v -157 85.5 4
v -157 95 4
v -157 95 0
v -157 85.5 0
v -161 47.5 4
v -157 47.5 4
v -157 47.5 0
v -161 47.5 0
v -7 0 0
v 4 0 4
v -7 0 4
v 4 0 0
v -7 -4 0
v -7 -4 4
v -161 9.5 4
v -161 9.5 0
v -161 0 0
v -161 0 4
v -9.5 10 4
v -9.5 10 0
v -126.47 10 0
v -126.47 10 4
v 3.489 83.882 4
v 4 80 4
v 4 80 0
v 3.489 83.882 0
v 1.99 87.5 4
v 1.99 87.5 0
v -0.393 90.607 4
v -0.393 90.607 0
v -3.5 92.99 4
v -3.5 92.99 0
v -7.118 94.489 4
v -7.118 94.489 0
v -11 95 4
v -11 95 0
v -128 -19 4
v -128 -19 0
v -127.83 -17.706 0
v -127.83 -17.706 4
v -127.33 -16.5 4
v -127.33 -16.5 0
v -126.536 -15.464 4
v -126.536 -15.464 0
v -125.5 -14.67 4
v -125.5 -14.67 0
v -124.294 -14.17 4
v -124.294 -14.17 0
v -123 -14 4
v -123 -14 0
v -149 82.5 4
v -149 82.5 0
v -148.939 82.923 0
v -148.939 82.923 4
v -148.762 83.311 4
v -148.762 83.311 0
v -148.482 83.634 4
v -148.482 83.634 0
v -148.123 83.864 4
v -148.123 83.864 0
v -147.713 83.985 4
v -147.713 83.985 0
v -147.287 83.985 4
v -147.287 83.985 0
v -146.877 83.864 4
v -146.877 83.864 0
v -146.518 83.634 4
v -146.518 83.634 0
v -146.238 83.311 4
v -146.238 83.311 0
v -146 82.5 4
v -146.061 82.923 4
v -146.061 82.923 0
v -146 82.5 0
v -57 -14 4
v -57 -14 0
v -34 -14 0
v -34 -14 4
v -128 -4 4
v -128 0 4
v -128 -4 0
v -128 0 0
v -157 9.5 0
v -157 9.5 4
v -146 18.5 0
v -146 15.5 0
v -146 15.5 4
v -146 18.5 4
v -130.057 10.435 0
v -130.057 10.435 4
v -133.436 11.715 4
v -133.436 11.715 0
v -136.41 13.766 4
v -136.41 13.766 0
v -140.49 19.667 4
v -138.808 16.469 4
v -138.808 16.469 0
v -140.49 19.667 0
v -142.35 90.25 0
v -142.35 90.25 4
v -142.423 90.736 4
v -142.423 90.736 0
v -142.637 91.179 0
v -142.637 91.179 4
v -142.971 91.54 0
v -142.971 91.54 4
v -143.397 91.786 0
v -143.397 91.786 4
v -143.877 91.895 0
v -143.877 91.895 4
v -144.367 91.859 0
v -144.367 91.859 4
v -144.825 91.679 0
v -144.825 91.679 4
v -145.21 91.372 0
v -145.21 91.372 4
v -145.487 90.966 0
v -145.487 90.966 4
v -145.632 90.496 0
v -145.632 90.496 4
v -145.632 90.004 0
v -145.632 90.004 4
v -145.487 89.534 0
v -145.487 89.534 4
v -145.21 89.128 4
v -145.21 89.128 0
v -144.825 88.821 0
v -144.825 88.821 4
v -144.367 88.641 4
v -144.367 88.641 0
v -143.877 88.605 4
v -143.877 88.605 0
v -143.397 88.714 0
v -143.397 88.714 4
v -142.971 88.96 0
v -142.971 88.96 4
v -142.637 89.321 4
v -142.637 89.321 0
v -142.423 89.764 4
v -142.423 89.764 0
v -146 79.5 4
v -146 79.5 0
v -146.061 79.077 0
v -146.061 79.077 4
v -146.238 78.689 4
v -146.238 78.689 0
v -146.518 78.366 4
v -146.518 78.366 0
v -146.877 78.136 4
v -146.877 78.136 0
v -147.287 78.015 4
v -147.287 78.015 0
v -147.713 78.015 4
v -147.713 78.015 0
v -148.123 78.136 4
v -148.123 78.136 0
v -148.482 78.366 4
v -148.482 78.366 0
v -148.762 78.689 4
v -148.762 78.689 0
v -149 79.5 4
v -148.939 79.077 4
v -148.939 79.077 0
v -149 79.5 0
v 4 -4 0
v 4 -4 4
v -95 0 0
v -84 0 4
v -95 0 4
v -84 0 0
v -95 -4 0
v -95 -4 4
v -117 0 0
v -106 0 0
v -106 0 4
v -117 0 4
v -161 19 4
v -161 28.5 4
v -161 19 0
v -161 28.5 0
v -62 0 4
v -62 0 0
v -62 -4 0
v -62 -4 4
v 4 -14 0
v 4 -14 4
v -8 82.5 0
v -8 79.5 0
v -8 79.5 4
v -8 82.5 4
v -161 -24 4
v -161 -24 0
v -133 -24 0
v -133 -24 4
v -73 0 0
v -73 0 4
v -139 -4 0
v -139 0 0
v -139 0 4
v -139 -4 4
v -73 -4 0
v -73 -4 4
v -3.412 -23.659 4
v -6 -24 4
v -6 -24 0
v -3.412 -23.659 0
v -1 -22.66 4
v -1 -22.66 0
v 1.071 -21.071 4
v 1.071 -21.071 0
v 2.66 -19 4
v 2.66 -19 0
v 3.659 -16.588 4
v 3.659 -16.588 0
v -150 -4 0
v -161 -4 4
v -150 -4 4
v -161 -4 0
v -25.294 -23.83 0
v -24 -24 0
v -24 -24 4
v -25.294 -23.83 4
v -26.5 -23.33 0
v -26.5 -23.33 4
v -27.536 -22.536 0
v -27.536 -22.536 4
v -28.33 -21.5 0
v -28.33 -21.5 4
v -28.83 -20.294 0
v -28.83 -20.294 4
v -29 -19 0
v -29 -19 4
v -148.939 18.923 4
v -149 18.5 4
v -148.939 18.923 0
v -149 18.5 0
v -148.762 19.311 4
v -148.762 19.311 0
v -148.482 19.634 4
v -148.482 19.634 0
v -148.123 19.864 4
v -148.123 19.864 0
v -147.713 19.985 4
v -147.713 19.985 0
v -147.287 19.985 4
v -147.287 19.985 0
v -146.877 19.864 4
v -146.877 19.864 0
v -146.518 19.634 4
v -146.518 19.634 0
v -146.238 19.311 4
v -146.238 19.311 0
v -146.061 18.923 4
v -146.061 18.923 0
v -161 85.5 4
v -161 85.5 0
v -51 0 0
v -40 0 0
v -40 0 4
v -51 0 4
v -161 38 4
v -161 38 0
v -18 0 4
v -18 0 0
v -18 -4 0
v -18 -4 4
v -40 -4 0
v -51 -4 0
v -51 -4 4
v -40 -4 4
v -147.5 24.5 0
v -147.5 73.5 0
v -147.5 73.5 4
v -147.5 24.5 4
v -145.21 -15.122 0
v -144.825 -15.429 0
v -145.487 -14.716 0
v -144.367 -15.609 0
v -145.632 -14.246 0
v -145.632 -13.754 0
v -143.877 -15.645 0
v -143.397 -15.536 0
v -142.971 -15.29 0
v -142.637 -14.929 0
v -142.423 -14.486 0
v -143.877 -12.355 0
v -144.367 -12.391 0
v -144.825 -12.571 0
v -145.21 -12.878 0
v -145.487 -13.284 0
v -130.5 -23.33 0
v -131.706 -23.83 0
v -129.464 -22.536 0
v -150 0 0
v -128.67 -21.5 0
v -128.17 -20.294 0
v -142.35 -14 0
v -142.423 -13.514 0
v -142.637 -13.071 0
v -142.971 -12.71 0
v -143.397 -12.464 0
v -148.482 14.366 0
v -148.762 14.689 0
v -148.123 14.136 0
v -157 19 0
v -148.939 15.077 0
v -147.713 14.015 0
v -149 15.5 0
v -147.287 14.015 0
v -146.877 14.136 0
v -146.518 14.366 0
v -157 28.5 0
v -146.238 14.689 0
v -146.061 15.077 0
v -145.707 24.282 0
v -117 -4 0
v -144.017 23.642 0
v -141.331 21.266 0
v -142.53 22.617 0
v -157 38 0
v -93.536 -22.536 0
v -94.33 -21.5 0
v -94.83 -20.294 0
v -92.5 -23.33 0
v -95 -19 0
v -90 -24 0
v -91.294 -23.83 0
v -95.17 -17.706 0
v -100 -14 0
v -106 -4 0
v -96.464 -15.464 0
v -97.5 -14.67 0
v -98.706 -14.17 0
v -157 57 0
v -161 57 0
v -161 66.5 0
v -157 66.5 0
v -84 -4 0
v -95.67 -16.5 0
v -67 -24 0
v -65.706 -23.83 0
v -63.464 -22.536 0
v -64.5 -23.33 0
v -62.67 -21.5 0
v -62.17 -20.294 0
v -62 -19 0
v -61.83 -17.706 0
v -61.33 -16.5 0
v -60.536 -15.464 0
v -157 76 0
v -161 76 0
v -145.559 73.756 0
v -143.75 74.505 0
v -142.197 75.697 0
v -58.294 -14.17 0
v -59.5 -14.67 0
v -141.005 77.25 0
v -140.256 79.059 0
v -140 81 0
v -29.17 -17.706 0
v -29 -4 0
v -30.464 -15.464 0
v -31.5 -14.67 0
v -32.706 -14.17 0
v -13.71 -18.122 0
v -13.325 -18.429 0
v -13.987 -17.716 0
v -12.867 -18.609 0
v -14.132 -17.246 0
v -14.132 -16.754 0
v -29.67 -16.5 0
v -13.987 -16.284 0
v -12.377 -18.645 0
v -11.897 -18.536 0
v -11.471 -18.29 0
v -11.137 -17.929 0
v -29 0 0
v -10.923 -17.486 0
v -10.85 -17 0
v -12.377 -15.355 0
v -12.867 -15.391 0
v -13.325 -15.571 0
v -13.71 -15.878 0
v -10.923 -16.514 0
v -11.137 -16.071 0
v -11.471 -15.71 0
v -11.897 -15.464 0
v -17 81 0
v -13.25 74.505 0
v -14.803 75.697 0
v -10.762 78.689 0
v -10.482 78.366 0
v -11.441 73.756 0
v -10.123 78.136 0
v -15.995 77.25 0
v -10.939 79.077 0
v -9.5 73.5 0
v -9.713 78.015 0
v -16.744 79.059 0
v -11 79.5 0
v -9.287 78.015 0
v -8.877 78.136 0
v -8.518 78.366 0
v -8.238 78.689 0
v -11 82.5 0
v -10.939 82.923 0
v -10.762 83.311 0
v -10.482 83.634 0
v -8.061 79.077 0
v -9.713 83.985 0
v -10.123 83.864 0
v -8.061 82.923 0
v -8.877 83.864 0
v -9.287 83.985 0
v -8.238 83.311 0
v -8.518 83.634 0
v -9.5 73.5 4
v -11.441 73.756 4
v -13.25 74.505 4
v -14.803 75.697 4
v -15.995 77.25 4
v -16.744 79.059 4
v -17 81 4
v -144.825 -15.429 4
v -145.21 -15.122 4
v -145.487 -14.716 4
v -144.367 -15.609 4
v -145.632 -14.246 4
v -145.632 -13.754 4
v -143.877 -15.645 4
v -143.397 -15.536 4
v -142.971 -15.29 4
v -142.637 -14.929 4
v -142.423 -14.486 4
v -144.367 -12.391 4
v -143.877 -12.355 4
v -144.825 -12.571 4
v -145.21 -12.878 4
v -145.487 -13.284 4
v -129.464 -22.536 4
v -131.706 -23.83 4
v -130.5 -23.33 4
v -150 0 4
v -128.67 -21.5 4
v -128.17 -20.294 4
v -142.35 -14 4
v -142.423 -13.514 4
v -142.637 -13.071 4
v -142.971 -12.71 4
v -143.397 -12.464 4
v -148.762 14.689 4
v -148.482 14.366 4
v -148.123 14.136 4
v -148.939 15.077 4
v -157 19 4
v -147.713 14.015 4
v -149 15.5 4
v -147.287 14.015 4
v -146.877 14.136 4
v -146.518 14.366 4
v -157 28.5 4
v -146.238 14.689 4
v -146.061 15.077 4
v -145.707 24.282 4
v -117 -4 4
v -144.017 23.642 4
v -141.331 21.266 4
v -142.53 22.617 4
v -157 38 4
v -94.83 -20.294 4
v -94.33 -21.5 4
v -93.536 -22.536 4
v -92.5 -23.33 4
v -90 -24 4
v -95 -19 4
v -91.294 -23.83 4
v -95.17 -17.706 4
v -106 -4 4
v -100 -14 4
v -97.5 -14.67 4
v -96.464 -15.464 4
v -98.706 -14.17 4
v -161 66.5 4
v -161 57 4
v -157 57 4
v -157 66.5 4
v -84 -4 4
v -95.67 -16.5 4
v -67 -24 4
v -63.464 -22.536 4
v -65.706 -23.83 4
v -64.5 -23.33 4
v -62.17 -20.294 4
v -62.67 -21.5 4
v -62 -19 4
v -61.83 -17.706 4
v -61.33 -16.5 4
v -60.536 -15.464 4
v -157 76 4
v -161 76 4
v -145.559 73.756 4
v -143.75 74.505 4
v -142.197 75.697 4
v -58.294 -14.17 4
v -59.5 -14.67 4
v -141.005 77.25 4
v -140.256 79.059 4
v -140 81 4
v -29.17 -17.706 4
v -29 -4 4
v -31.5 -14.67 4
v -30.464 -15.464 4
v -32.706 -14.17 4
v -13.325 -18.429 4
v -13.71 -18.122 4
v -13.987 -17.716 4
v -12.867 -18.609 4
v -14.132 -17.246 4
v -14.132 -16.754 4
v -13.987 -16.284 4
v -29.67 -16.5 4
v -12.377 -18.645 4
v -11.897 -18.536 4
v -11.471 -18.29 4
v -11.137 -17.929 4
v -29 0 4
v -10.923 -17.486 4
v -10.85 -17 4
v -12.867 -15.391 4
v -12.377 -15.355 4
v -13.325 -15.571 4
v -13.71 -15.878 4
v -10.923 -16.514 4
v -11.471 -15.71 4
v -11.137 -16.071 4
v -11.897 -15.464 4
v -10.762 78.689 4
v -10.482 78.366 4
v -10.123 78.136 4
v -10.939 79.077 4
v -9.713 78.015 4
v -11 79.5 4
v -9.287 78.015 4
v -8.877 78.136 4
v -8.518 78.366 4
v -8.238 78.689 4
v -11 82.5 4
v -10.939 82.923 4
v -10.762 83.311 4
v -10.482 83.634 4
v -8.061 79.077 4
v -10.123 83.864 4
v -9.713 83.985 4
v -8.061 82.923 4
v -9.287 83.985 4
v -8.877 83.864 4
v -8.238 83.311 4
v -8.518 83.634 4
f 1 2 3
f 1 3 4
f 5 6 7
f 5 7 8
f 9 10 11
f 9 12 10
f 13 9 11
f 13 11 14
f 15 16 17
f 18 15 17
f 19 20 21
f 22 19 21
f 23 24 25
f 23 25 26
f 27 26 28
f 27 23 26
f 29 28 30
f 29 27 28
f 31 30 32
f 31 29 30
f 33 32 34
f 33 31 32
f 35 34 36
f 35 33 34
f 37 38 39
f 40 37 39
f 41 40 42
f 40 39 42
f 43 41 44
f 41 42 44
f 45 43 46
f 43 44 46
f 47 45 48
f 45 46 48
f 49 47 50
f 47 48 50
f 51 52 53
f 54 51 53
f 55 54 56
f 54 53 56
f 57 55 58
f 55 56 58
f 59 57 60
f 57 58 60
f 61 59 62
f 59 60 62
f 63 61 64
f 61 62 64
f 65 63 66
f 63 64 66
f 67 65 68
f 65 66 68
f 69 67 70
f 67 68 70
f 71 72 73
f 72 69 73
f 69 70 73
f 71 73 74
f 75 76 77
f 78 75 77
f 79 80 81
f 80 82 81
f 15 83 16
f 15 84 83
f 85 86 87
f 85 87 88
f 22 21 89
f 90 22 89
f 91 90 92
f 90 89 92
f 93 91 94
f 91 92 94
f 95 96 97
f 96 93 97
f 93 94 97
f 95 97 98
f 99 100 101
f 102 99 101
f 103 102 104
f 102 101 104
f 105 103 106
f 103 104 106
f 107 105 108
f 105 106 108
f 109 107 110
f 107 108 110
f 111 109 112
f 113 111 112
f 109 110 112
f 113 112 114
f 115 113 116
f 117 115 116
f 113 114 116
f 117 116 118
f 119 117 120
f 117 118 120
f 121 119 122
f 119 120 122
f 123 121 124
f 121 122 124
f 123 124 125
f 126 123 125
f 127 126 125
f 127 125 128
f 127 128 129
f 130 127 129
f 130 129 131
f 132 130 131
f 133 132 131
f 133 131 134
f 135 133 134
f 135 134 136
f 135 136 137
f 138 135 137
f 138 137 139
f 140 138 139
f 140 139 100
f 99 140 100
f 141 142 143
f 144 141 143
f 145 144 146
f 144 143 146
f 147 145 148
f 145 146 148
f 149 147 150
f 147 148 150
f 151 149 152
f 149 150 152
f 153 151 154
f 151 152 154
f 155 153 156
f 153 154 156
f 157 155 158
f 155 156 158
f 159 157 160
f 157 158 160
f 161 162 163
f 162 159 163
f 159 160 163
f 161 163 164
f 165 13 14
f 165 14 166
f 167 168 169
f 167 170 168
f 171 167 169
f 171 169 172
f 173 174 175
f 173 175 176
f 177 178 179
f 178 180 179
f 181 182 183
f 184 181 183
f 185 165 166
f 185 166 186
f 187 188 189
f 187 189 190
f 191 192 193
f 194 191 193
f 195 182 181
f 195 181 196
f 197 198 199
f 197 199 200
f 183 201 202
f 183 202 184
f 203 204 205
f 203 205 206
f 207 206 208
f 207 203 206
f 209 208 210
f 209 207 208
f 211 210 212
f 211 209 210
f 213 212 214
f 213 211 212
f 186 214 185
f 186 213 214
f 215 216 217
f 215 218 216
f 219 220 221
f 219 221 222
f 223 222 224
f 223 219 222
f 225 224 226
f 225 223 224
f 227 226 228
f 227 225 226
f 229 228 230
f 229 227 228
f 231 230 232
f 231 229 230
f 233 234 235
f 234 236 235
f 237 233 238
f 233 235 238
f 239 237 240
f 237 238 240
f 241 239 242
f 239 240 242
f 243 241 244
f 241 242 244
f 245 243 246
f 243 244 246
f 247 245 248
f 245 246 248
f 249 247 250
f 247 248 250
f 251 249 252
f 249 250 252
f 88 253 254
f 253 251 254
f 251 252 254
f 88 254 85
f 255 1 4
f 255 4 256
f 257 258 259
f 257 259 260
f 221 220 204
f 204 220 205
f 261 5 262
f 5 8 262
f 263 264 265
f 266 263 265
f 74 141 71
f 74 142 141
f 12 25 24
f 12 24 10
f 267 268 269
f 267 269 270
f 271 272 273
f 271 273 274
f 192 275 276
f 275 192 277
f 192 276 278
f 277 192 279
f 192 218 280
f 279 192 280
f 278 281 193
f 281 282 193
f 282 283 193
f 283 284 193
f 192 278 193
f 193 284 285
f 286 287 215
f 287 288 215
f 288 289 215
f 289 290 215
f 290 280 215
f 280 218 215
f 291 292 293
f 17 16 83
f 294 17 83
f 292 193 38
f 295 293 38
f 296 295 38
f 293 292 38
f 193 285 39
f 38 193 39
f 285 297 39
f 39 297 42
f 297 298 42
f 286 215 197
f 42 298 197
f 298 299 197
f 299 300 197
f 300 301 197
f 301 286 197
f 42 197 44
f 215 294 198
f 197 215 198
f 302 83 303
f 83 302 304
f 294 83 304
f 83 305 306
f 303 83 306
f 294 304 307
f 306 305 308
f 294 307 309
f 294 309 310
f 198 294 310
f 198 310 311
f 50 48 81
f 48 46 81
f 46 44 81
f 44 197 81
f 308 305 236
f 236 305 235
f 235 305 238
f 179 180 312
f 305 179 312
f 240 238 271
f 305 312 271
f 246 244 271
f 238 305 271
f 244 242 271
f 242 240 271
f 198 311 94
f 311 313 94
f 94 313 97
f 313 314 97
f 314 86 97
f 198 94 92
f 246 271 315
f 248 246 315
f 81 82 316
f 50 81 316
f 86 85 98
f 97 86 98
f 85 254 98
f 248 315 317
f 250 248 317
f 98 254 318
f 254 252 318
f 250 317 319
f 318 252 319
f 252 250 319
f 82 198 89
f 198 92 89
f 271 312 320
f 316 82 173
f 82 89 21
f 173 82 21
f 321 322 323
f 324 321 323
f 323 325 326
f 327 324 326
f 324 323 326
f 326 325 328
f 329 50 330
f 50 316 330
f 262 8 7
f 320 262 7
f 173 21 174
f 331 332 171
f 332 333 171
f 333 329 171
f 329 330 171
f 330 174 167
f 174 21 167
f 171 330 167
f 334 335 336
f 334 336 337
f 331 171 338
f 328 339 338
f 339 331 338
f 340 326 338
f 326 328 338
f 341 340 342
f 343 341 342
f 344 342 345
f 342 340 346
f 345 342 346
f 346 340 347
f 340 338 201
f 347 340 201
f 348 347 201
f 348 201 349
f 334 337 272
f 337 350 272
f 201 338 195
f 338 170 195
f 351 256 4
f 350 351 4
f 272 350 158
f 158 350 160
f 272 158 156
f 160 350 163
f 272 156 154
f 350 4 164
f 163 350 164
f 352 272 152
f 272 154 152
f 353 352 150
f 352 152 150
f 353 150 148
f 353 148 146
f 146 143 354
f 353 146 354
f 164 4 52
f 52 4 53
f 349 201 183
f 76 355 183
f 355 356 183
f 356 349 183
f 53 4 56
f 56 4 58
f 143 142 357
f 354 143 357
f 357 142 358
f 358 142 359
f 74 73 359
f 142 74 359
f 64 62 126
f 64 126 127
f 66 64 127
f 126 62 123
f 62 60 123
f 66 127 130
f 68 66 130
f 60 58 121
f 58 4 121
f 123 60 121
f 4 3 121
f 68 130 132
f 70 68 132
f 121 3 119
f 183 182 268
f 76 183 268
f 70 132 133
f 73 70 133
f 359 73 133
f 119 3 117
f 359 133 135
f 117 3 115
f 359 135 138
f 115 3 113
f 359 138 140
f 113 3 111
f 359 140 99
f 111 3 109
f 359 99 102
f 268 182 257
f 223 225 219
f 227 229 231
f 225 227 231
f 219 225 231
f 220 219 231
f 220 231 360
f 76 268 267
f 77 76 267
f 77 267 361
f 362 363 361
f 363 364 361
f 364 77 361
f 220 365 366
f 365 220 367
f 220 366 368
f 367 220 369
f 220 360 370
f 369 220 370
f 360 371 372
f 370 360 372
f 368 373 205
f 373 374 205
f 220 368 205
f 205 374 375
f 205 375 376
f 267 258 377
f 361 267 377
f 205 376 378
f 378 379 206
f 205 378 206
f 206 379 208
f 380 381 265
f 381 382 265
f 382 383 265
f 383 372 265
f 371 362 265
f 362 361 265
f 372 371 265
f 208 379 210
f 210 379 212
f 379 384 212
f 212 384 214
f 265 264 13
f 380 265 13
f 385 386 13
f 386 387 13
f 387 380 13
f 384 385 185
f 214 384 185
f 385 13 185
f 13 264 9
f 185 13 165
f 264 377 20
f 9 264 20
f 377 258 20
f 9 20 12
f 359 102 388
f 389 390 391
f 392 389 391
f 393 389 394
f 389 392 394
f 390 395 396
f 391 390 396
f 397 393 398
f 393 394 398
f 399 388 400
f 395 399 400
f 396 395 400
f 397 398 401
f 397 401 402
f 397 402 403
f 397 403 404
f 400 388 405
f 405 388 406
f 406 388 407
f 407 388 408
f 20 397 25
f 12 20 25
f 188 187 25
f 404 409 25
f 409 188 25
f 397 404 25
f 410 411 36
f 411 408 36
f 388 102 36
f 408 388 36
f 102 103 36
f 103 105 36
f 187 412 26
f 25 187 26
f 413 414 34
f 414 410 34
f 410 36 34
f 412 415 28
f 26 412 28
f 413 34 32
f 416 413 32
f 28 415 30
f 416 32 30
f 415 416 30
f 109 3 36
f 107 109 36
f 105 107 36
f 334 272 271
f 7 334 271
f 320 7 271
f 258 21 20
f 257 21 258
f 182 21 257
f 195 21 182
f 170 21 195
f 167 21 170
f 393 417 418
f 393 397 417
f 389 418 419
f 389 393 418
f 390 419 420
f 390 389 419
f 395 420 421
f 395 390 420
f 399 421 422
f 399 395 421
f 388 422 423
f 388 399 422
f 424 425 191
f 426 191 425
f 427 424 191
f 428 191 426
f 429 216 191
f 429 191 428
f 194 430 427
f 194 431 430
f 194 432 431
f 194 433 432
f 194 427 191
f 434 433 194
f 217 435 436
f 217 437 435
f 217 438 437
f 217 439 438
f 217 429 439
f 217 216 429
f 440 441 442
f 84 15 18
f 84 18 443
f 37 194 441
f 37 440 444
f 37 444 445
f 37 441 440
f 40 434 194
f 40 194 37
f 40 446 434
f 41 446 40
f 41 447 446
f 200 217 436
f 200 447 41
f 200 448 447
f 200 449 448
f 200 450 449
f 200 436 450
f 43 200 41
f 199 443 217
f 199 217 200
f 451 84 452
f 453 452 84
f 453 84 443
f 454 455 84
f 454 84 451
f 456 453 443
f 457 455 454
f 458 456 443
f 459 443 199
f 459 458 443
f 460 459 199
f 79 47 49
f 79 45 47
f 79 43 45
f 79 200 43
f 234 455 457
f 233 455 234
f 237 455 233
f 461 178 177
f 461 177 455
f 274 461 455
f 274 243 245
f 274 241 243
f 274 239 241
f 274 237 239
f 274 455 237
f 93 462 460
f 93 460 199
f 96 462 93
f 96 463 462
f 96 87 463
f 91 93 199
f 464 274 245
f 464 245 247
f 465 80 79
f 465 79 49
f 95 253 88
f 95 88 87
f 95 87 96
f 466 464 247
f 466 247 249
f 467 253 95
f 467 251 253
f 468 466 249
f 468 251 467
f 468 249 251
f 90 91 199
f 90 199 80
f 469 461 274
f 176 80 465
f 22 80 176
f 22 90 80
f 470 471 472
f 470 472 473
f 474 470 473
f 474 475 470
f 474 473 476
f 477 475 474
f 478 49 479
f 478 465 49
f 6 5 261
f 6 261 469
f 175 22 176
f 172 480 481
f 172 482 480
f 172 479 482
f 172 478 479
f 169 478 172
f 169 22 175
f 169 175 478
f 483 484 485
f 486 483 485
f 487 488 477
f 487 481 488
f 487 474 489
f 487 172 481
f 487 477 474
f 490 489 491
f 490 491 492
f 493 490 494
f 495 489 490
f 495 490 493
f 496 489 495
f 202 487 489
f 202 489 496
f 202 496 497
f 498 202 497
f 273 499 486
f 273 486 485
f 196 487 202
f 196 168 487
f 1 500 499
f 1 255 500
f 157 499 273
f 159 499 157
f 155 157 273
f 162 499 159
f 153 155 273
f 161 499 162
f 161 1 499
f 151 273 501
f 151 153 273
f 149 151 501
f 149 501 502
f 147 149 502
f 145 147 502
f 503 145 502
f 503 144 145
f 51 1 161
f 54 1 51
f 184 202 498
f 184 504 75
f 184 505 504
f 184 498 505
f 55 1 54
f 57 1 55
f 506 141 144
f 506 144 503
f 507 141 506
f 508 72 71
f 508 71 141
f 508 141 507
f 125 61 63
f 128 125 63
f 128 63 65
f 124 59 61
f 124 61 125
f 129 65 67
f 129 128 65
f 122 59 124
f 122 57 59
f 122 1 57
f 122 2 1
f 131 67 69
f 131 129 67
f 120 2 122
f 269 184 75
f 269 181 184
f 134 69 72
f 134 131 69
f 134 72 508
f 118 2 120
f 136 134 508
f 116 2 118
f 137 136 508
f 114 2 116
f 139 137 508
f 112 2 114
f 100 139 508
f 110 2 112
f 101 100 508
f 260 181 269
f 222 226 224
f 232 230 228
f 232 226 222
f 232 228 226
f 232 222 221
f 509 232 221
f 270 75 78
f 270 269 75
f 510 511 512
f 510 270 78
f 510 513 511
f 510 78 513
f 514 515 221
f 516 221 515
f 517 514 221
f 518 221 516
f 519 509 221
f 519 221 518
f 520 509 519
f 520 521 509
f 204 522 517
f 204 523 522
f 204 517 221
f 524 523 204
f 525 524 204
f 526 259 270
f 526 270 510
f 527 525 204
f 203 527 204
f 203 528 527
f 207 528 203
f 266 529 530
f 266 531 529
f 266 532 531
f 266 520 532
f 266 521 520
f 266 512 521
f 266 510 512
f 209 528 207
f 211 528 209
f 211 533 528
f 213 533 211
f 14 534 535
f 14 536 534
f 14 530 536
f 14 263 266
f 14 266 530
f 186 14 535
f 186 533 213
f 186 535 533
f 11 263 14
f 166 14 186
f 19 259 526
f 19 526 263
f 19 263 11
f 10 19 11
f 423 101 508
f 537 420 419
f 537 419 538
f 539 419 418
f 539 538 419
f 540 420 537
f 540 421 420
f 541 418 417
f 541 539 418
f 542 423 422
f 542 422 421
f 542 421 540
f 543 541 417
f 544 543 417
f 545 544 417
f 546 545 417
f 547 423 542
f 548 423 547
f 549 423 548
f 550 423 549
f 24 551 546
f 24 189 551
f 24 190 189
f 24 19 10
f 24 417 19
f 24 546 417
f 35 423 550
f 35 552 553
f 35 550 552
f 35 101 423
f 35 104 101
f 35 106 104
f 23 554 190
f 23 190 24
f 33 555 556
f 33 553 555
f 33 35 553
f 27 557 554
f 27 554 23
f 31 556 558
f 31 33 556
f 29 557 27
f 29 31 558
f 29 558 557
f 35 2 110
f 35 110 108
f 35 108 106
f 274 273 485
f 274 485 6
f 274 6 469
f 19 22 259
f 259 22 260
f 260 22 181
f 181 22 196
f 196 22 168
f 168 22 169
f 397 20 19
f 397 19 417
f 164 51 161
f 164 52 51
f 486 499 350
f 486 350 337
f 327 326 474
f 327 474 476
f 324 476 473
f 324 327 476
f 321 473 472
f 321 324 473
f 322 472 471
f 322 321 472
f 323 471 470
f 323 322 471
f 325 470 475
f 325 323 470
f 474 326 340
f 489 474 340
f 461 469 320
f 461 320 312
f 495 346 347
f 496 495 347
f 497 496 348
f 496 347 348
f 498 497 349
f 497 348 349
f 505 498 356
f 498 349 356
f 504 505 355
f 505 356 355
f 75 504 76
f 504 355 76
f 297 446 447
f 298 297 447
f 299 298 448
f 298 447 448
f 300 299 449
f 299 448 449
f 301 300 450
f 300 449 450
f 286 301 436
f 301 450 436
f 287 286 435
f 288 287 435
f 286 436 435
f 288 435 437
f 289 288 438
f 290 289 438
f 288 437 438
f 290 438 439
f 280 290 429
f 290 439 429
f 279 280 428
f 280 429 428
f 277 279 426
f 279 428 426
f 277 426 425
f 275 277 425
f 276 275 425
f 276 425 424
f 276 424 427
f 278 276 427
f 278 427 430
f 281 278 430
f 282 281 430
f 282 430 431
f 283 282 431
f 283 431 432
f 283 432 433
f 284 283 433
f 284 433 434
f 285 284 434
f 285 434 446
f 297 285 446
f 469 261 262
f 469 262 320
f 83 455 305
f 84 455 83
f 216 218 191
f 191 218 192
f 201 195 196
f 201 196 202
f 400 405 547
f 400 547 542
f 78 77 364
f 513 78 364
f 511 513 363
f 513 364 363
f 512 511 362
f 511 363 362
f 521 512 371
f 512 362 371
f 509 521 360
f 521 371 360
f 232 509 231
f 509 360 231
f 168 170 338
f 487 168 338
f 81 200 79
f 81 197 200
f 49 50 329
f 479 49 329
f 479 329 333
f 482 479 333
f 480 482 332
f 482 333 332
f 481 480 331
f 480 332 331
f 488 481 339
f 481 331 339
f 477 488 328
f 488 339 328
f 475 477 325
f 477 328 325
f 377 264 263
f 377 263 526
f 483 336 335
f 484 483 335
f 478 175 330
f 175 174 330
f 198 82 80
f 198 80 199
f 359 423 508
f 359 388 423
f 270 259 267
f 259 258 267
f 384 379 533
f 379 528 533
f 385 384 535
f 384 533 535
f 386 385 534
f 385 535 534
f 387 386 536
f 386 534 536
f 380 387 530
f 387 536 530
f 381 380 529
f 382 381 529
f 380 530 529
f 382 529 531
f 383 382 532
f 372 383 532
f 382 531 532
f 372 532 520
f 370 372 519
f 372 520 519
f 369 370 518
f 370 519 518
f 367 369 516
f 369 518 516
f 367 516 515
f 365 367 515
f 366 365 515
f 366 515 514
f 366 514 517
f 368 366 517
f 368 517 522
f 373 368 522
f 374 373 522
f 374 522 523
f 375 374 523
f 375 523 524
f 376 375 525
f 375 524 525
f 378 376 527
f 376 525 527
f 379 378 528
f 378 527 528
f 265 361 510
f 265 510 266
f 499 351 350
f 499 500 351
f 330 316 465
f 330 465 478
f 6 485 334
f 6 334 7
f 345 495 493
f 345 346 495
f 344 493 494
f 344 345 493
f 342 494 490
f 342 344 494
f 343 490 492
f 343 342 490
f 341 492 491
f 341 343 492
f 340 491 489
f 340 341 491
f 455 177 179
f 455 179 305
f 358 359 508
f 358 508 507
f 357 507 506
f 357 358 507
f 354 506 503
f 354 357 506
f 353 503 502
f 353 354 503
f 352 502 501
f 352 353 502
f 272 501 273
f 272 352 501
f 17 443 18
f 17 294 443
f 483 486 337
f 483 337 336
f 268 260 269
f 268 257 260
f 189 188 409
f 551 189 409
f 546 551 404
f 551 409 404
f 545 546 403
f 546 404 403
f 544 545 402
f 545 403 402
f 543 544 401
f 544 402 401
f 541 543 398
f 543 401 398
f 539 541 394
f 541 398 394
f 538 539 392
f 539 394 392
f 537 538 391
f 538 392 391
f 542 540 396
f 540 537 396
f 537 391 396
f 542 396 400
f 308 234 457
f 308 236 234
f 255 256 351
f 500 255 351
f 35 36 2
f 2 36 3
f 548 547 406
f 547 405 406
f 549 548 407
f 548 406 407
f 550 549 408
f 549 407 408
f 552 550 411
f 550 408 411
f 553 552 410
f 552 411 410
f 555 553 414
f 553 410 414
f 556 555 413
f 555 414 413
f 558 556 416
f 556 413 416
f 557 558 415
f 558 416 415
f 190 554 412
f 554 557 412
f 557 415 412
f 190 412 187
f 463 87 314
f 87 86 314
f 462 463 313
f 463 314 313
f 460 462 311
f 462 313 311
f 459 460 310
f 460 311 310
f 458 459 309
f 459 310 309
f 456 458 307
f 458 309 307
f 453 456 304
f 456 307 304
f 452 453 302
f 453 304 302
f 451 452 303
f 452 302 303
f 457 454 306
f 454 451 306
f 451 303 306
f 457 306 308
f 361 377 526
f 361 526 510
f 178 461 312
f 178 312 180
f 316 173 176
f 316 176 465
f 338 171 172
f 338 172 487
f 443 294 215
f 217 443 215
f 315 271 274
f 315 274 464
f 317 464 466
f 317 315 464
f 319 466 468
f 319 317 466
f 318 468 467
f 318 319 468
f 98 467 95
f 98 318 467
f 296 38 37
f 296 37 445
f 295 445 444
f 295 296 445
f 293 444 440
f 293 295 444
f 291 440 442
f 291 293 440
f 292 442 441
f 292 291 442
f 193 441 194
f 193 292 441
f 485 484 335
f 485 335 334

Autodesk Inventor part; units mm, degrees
ref_plane "YZ Plane" through (0, 0, 0) normal (1, 0, 0) x (0, 1, 0)
ref_plane "XZ Plane" through (0, 0, 0) normal (0, 1, 0) x (-1, 0, 0)
ref_plane "XY Plane" through (0, 0, 0) normal (0, 0, 1) x (1, 0, 0)
sketch "Schizzo1" plane through (0, 0, 0) normal (0, 0, 1) x (1, 0, 0)
  line L0 (-152.5, 86) -> (-2.5, 86) construction
  line L1 (-152.5, 0) -> (-152.5, 86) construction
  line L2 (-2.5, 0) -> (-2.5, 86) construction
  circle A0 centre (-9.5, 81) radius 1.5 projected
  circle A1 centre (-147.5, 81) radius 1.5 projected
  circle A2 centre (-147.5, 17) radius 1.5 projected
  line L3 (4, 95) -> (-161, 95)
  line L4 (-161, -24) -> (-133, -24)
  line L5 (-128, -19) -> (-128, -19)
  line L6 (-123, -14) -> (-100, -14)
  line L7 (-95, -19) -> (-95, -19)
  line L8 (-90, -24) -> (-67, -24)
  line L9 (-62, -19) -> (-62, -19)
  line L10 (-57, -14) -> (-34, -14)
  line L11 (-29, -19) -> (-29, -19)
  line L12 (-24, -24) -> (4, -24)
  arc A3 (-133, -24) -> (-128, -19) centre (-133, -19) ccw
  arc A4 (-123, -14) -> (-128, -19) centre (-123, -19) ccw
  arc A5 (-95, -19) -> (-100, -14) centre (-100, -19) ccw
  arc A6 (-95, -19) -> (-90, -24) centre (-90, -19) ccw
  arc A7 (-67, -24) -> (-62, -19) centre (-67, -19) ccw
  arc A8 (-57, -14) -> (-62, -19) centre (-57, -19) ccw
  arc A9 (-29, -19) -> (-34, -14) centre (-34, -19) ccw
  arc A10 (-29, -19) -> (-24, -24) centre (-24, -19) ccw
  arc A11 (-17, 81) -> (-9.5, 73.5) centre (-9.5, 81) ccw
  arc A12 (-147.5, 73.5) -> (-140, 81) centre (-147.5, 81) ccw
  arc A13 (-140.4901, 19.6667) -> (-147.5, 24.5) centre (-147.5, 17) ccw
  line L13 (-147.5, 73.5) -> (-147.5, 24.5)
  line L14 (-17, 81) -> (-140, 81)
  line L15 (-9.5, 10) -> (-126.4703, 10)
  arc A14 (-140.4901, 19.6667) -> (-126.4703, 10) centre (-126.4703, 25) ccw
  line L16 (-9.5, 10) -> (-9.5, 73.5)
  line L17 (-161, 95) -> (-161, -24)
  line L18 (4, 95) -> (4, -24)
  line L19 (-161, -4) -> (-150, -4) projected
  line L20 (-150, 0) -> (-150, -4) projected
  line L21 (-150, 0) -> (-161, 0) projected
  line L22 (-161, 0) -> (-161, -4) projected
  line L23 (-139, -4) -> (-128, -4) projected
  line L24 (-128, 0) -> (-128, -4) projected
  line L25 (-128, 0) -> (-139, 0) projected
  line L26 (-139, 0) -> (-139, -4) projected
  line L27 (-117, -4) -> (-106, -4) projected
  line L28 (-106, 0) -> (-106, -4) projected
  line L29 (-106, 0) -> (-117, 0) projected
  line L30 (-117, 0) -> (-117, -4) projected
  line L31 (-95, -4) -> (-84, -4) projected
  line L32 (-84, 0) -> (-84, -4) projected
  line L33 (-84, 0) -> (-95, 0) projected
  line L34 (-95, 0) -> (-95, -4) projected
  line L35 (-73, -4) -> (-62, -4) projected
  line L36 (-62, 0) -> (-62, -4) projected
  line L37 (-62, 0) -> (-73, 0) projected
  line L38 (-73, 0) -> (-73, -4) projected
  line L39 (-51, -4) -> (-40, -4) projected
  line L40 (-40, 0) -> (-40, -4) projected
  line L41 (-40, 0) -> (-51, 0) projected
  line L42 (-51, 0) -> (-51, -4) projected
  line L43 (-29, -4) -> (-18, -4) projected
  line L44 (-18, 0) -> (-18, -4) projected
  line L45 (-18, 0) -> (-29, 0) projected
  line L46 (-29, 0) -> (-29, -4) projected
  line L47 (-7, -4) -> (4, -4) projected
  line L48 (-7, 0) -> (-7, -4) projected
  line L49 (-147.5, 82.5) -> (-147.5, 79.5) construction
  line L50 (-149, 82.5) -> (-149, 79.5)
  line L51 (-146, 79.5) -> (-146, 82.5)
  arc A15 (-146, 82.5) -> (-149, 82.5) centre (-147.5, 82.5) ccw
  arc A16 (-149, 79.5) -> (-146, 79.5) centre (-147.5, 79.5) ccw
  line L52 (-9.5, 82.5) -> (-9.5, 79.5) construction
  line L53 (-11, 82.5) -> (-11, 79.5)
  line L54 (-8, 79.5) -> (-8, 82.5)
  arc A17 (-8, 82.5) -> (-11, 82.5) centre (-9.5, 82.5) ccw
  arc A18 (-11, 79.5) -> (-8, 79.5) centre (-9.5, 79.5) ccw
  line L55 (-147.5, 18.5) -> (-147.5, 15.5) construction
  line L56 (-149, 18.5) -> (-149, 15.5)
  line L57 (-146, 15.5) -> (-146, 18.5)
  arc A19 (-146, 18.5) -> (-149, 18.5) centre (-147.5, 18.5) ccw
  arc A20 (-149, 15.5) -> (-146, 15.5) centre (-147.5, 15.5) ccw
  line L58 (4, 0) -> (4, -4) projected
  line L59 (4, 0) -> (-7, 0) projected
  point P0 (-128, -24)
  point P1 (-128, -14)
  point P2 (-95, -14)
  point P3 (-95, -24)
  point P4 (-62, -24)
  point P5 (-62, -14)
  point P6 (-29, -14)
  point P7 (-29, -24)
  point P8 (-144.8074, 10)
  dimension "d0" = 165
  dimension "d9" = 33
  dimension "d10" = 10
  dimension "d11" = 33
  dimension "d12" = 10
  dimension "d13" = 33
  dimension "d14" = 10
  dimension "d15" = 33
  dimension "d16" = 5
  dimension "d21" = 15
extrude "Estrusione1" add sketch "Schizzo1" along normal blind 4 contours L18 L59 L48 L47 L12 A10 A9 L10 A8 A7 L8 A6 A5 L6 A4 A3 L4 L17 L19 L20 L21 L3
sketch "Schizzo2" plane through (0, 0, 4) normal (0, 0, 1) x (1, 0, 0)
  line L0 (-157, 85.5) -> (-161, 85.5)
  line L1 (-161, 85.5) -> (-161, 95)
  line L2 (-161, 95) -> (-157, 95)
  line L3 (-157, 95) -> (-157, 85.5)
  line L4 (-157, 66.5) -> (-161, 66.5)
  line L5 (-161, 66.5) -> (-161, 76)
  line L6 (-161, 76) -> (-157, 76)
  line L7 (-157, 76) -> (-157, 66.5)
  line L8 (-161, 57) -> (-157, 57)
  line L9 (-157, 57) -> (-157, 47.5)
  line L10 (-157, 47.5) -> (-161, 47.5)
  line L11 (-161, 47.5) -> (-161, 57)
  line L12 (-157, 28.5) -> (-161, 28.5)
  line L13 (-161, 28.5) -> (-161, 38)
  line L14 (-161, 38) -> (-157, 38)
  line L15 (-157, 38) -> (-157, 28.5)
  line L16 (-161, 19) -> (-157, 19)
  line L17 (-157, 19) -> (-157, 9.5)
  line L18 (-157, 9.5) -> (-161, 9.5)
  line L19 (-161, 9.5) -> (-161, 19)
  point P0 (0, 0)
extrude "Estrusione2" cut sketch "Schizzo2" against normal blind 4
fillet "Raccordo1" radius 15 1 edges at (4, 95, 2)
fillet "Raccordo2" radius 10 1 edges at (4, -24, 2)
sketch "Schizzo3" plane through (0, 0, 4) normal (0, 0, 1) x (1, 0, 0)
  line L0 (-14.15, 0) -> (-10.85, 0) projected
  line L1 (-146.15, 0) -> (-142.85, 0) projected
  line L2 (-144.5, 0) -> (-137.5, 0) construction
  line L3 (-12.5, 0) -> (-12.5, -17) construction
  circle A0 centre (-12.5, -17) radius 1.65
  line L4 (-157, 82.4) -> (-157, 79.1) construction
  line L5 (-157, 85.5) -> (-157, 95) construction
  line L6 (-157, 95) -> (-157, 85.5) projected
  line L7 (-157, 90.25) -> (-144, 90.25) construction
  circle A1 centre (-144, 90.25) radius 1.65
  line L8 (-157, -12.35) -> (-157, -15.65) construction
  line L9 (-157, -14) -> (-144, -14) construction
  circle A2 centre (-144, -14) radius 1.65
  point P0 (0, 0)
  dimension "d32" = 3.3
  dimension "d35" = 13
  dimension "d36" = 3.3
  dimension "d37" = 13
  dimension "d38" = 3.3
  dimension "d39" = 17
extrude "Estrusione3" cut sketch "Schizzo3" against normal blind 4
properties part number "LatoAlimentatore"
